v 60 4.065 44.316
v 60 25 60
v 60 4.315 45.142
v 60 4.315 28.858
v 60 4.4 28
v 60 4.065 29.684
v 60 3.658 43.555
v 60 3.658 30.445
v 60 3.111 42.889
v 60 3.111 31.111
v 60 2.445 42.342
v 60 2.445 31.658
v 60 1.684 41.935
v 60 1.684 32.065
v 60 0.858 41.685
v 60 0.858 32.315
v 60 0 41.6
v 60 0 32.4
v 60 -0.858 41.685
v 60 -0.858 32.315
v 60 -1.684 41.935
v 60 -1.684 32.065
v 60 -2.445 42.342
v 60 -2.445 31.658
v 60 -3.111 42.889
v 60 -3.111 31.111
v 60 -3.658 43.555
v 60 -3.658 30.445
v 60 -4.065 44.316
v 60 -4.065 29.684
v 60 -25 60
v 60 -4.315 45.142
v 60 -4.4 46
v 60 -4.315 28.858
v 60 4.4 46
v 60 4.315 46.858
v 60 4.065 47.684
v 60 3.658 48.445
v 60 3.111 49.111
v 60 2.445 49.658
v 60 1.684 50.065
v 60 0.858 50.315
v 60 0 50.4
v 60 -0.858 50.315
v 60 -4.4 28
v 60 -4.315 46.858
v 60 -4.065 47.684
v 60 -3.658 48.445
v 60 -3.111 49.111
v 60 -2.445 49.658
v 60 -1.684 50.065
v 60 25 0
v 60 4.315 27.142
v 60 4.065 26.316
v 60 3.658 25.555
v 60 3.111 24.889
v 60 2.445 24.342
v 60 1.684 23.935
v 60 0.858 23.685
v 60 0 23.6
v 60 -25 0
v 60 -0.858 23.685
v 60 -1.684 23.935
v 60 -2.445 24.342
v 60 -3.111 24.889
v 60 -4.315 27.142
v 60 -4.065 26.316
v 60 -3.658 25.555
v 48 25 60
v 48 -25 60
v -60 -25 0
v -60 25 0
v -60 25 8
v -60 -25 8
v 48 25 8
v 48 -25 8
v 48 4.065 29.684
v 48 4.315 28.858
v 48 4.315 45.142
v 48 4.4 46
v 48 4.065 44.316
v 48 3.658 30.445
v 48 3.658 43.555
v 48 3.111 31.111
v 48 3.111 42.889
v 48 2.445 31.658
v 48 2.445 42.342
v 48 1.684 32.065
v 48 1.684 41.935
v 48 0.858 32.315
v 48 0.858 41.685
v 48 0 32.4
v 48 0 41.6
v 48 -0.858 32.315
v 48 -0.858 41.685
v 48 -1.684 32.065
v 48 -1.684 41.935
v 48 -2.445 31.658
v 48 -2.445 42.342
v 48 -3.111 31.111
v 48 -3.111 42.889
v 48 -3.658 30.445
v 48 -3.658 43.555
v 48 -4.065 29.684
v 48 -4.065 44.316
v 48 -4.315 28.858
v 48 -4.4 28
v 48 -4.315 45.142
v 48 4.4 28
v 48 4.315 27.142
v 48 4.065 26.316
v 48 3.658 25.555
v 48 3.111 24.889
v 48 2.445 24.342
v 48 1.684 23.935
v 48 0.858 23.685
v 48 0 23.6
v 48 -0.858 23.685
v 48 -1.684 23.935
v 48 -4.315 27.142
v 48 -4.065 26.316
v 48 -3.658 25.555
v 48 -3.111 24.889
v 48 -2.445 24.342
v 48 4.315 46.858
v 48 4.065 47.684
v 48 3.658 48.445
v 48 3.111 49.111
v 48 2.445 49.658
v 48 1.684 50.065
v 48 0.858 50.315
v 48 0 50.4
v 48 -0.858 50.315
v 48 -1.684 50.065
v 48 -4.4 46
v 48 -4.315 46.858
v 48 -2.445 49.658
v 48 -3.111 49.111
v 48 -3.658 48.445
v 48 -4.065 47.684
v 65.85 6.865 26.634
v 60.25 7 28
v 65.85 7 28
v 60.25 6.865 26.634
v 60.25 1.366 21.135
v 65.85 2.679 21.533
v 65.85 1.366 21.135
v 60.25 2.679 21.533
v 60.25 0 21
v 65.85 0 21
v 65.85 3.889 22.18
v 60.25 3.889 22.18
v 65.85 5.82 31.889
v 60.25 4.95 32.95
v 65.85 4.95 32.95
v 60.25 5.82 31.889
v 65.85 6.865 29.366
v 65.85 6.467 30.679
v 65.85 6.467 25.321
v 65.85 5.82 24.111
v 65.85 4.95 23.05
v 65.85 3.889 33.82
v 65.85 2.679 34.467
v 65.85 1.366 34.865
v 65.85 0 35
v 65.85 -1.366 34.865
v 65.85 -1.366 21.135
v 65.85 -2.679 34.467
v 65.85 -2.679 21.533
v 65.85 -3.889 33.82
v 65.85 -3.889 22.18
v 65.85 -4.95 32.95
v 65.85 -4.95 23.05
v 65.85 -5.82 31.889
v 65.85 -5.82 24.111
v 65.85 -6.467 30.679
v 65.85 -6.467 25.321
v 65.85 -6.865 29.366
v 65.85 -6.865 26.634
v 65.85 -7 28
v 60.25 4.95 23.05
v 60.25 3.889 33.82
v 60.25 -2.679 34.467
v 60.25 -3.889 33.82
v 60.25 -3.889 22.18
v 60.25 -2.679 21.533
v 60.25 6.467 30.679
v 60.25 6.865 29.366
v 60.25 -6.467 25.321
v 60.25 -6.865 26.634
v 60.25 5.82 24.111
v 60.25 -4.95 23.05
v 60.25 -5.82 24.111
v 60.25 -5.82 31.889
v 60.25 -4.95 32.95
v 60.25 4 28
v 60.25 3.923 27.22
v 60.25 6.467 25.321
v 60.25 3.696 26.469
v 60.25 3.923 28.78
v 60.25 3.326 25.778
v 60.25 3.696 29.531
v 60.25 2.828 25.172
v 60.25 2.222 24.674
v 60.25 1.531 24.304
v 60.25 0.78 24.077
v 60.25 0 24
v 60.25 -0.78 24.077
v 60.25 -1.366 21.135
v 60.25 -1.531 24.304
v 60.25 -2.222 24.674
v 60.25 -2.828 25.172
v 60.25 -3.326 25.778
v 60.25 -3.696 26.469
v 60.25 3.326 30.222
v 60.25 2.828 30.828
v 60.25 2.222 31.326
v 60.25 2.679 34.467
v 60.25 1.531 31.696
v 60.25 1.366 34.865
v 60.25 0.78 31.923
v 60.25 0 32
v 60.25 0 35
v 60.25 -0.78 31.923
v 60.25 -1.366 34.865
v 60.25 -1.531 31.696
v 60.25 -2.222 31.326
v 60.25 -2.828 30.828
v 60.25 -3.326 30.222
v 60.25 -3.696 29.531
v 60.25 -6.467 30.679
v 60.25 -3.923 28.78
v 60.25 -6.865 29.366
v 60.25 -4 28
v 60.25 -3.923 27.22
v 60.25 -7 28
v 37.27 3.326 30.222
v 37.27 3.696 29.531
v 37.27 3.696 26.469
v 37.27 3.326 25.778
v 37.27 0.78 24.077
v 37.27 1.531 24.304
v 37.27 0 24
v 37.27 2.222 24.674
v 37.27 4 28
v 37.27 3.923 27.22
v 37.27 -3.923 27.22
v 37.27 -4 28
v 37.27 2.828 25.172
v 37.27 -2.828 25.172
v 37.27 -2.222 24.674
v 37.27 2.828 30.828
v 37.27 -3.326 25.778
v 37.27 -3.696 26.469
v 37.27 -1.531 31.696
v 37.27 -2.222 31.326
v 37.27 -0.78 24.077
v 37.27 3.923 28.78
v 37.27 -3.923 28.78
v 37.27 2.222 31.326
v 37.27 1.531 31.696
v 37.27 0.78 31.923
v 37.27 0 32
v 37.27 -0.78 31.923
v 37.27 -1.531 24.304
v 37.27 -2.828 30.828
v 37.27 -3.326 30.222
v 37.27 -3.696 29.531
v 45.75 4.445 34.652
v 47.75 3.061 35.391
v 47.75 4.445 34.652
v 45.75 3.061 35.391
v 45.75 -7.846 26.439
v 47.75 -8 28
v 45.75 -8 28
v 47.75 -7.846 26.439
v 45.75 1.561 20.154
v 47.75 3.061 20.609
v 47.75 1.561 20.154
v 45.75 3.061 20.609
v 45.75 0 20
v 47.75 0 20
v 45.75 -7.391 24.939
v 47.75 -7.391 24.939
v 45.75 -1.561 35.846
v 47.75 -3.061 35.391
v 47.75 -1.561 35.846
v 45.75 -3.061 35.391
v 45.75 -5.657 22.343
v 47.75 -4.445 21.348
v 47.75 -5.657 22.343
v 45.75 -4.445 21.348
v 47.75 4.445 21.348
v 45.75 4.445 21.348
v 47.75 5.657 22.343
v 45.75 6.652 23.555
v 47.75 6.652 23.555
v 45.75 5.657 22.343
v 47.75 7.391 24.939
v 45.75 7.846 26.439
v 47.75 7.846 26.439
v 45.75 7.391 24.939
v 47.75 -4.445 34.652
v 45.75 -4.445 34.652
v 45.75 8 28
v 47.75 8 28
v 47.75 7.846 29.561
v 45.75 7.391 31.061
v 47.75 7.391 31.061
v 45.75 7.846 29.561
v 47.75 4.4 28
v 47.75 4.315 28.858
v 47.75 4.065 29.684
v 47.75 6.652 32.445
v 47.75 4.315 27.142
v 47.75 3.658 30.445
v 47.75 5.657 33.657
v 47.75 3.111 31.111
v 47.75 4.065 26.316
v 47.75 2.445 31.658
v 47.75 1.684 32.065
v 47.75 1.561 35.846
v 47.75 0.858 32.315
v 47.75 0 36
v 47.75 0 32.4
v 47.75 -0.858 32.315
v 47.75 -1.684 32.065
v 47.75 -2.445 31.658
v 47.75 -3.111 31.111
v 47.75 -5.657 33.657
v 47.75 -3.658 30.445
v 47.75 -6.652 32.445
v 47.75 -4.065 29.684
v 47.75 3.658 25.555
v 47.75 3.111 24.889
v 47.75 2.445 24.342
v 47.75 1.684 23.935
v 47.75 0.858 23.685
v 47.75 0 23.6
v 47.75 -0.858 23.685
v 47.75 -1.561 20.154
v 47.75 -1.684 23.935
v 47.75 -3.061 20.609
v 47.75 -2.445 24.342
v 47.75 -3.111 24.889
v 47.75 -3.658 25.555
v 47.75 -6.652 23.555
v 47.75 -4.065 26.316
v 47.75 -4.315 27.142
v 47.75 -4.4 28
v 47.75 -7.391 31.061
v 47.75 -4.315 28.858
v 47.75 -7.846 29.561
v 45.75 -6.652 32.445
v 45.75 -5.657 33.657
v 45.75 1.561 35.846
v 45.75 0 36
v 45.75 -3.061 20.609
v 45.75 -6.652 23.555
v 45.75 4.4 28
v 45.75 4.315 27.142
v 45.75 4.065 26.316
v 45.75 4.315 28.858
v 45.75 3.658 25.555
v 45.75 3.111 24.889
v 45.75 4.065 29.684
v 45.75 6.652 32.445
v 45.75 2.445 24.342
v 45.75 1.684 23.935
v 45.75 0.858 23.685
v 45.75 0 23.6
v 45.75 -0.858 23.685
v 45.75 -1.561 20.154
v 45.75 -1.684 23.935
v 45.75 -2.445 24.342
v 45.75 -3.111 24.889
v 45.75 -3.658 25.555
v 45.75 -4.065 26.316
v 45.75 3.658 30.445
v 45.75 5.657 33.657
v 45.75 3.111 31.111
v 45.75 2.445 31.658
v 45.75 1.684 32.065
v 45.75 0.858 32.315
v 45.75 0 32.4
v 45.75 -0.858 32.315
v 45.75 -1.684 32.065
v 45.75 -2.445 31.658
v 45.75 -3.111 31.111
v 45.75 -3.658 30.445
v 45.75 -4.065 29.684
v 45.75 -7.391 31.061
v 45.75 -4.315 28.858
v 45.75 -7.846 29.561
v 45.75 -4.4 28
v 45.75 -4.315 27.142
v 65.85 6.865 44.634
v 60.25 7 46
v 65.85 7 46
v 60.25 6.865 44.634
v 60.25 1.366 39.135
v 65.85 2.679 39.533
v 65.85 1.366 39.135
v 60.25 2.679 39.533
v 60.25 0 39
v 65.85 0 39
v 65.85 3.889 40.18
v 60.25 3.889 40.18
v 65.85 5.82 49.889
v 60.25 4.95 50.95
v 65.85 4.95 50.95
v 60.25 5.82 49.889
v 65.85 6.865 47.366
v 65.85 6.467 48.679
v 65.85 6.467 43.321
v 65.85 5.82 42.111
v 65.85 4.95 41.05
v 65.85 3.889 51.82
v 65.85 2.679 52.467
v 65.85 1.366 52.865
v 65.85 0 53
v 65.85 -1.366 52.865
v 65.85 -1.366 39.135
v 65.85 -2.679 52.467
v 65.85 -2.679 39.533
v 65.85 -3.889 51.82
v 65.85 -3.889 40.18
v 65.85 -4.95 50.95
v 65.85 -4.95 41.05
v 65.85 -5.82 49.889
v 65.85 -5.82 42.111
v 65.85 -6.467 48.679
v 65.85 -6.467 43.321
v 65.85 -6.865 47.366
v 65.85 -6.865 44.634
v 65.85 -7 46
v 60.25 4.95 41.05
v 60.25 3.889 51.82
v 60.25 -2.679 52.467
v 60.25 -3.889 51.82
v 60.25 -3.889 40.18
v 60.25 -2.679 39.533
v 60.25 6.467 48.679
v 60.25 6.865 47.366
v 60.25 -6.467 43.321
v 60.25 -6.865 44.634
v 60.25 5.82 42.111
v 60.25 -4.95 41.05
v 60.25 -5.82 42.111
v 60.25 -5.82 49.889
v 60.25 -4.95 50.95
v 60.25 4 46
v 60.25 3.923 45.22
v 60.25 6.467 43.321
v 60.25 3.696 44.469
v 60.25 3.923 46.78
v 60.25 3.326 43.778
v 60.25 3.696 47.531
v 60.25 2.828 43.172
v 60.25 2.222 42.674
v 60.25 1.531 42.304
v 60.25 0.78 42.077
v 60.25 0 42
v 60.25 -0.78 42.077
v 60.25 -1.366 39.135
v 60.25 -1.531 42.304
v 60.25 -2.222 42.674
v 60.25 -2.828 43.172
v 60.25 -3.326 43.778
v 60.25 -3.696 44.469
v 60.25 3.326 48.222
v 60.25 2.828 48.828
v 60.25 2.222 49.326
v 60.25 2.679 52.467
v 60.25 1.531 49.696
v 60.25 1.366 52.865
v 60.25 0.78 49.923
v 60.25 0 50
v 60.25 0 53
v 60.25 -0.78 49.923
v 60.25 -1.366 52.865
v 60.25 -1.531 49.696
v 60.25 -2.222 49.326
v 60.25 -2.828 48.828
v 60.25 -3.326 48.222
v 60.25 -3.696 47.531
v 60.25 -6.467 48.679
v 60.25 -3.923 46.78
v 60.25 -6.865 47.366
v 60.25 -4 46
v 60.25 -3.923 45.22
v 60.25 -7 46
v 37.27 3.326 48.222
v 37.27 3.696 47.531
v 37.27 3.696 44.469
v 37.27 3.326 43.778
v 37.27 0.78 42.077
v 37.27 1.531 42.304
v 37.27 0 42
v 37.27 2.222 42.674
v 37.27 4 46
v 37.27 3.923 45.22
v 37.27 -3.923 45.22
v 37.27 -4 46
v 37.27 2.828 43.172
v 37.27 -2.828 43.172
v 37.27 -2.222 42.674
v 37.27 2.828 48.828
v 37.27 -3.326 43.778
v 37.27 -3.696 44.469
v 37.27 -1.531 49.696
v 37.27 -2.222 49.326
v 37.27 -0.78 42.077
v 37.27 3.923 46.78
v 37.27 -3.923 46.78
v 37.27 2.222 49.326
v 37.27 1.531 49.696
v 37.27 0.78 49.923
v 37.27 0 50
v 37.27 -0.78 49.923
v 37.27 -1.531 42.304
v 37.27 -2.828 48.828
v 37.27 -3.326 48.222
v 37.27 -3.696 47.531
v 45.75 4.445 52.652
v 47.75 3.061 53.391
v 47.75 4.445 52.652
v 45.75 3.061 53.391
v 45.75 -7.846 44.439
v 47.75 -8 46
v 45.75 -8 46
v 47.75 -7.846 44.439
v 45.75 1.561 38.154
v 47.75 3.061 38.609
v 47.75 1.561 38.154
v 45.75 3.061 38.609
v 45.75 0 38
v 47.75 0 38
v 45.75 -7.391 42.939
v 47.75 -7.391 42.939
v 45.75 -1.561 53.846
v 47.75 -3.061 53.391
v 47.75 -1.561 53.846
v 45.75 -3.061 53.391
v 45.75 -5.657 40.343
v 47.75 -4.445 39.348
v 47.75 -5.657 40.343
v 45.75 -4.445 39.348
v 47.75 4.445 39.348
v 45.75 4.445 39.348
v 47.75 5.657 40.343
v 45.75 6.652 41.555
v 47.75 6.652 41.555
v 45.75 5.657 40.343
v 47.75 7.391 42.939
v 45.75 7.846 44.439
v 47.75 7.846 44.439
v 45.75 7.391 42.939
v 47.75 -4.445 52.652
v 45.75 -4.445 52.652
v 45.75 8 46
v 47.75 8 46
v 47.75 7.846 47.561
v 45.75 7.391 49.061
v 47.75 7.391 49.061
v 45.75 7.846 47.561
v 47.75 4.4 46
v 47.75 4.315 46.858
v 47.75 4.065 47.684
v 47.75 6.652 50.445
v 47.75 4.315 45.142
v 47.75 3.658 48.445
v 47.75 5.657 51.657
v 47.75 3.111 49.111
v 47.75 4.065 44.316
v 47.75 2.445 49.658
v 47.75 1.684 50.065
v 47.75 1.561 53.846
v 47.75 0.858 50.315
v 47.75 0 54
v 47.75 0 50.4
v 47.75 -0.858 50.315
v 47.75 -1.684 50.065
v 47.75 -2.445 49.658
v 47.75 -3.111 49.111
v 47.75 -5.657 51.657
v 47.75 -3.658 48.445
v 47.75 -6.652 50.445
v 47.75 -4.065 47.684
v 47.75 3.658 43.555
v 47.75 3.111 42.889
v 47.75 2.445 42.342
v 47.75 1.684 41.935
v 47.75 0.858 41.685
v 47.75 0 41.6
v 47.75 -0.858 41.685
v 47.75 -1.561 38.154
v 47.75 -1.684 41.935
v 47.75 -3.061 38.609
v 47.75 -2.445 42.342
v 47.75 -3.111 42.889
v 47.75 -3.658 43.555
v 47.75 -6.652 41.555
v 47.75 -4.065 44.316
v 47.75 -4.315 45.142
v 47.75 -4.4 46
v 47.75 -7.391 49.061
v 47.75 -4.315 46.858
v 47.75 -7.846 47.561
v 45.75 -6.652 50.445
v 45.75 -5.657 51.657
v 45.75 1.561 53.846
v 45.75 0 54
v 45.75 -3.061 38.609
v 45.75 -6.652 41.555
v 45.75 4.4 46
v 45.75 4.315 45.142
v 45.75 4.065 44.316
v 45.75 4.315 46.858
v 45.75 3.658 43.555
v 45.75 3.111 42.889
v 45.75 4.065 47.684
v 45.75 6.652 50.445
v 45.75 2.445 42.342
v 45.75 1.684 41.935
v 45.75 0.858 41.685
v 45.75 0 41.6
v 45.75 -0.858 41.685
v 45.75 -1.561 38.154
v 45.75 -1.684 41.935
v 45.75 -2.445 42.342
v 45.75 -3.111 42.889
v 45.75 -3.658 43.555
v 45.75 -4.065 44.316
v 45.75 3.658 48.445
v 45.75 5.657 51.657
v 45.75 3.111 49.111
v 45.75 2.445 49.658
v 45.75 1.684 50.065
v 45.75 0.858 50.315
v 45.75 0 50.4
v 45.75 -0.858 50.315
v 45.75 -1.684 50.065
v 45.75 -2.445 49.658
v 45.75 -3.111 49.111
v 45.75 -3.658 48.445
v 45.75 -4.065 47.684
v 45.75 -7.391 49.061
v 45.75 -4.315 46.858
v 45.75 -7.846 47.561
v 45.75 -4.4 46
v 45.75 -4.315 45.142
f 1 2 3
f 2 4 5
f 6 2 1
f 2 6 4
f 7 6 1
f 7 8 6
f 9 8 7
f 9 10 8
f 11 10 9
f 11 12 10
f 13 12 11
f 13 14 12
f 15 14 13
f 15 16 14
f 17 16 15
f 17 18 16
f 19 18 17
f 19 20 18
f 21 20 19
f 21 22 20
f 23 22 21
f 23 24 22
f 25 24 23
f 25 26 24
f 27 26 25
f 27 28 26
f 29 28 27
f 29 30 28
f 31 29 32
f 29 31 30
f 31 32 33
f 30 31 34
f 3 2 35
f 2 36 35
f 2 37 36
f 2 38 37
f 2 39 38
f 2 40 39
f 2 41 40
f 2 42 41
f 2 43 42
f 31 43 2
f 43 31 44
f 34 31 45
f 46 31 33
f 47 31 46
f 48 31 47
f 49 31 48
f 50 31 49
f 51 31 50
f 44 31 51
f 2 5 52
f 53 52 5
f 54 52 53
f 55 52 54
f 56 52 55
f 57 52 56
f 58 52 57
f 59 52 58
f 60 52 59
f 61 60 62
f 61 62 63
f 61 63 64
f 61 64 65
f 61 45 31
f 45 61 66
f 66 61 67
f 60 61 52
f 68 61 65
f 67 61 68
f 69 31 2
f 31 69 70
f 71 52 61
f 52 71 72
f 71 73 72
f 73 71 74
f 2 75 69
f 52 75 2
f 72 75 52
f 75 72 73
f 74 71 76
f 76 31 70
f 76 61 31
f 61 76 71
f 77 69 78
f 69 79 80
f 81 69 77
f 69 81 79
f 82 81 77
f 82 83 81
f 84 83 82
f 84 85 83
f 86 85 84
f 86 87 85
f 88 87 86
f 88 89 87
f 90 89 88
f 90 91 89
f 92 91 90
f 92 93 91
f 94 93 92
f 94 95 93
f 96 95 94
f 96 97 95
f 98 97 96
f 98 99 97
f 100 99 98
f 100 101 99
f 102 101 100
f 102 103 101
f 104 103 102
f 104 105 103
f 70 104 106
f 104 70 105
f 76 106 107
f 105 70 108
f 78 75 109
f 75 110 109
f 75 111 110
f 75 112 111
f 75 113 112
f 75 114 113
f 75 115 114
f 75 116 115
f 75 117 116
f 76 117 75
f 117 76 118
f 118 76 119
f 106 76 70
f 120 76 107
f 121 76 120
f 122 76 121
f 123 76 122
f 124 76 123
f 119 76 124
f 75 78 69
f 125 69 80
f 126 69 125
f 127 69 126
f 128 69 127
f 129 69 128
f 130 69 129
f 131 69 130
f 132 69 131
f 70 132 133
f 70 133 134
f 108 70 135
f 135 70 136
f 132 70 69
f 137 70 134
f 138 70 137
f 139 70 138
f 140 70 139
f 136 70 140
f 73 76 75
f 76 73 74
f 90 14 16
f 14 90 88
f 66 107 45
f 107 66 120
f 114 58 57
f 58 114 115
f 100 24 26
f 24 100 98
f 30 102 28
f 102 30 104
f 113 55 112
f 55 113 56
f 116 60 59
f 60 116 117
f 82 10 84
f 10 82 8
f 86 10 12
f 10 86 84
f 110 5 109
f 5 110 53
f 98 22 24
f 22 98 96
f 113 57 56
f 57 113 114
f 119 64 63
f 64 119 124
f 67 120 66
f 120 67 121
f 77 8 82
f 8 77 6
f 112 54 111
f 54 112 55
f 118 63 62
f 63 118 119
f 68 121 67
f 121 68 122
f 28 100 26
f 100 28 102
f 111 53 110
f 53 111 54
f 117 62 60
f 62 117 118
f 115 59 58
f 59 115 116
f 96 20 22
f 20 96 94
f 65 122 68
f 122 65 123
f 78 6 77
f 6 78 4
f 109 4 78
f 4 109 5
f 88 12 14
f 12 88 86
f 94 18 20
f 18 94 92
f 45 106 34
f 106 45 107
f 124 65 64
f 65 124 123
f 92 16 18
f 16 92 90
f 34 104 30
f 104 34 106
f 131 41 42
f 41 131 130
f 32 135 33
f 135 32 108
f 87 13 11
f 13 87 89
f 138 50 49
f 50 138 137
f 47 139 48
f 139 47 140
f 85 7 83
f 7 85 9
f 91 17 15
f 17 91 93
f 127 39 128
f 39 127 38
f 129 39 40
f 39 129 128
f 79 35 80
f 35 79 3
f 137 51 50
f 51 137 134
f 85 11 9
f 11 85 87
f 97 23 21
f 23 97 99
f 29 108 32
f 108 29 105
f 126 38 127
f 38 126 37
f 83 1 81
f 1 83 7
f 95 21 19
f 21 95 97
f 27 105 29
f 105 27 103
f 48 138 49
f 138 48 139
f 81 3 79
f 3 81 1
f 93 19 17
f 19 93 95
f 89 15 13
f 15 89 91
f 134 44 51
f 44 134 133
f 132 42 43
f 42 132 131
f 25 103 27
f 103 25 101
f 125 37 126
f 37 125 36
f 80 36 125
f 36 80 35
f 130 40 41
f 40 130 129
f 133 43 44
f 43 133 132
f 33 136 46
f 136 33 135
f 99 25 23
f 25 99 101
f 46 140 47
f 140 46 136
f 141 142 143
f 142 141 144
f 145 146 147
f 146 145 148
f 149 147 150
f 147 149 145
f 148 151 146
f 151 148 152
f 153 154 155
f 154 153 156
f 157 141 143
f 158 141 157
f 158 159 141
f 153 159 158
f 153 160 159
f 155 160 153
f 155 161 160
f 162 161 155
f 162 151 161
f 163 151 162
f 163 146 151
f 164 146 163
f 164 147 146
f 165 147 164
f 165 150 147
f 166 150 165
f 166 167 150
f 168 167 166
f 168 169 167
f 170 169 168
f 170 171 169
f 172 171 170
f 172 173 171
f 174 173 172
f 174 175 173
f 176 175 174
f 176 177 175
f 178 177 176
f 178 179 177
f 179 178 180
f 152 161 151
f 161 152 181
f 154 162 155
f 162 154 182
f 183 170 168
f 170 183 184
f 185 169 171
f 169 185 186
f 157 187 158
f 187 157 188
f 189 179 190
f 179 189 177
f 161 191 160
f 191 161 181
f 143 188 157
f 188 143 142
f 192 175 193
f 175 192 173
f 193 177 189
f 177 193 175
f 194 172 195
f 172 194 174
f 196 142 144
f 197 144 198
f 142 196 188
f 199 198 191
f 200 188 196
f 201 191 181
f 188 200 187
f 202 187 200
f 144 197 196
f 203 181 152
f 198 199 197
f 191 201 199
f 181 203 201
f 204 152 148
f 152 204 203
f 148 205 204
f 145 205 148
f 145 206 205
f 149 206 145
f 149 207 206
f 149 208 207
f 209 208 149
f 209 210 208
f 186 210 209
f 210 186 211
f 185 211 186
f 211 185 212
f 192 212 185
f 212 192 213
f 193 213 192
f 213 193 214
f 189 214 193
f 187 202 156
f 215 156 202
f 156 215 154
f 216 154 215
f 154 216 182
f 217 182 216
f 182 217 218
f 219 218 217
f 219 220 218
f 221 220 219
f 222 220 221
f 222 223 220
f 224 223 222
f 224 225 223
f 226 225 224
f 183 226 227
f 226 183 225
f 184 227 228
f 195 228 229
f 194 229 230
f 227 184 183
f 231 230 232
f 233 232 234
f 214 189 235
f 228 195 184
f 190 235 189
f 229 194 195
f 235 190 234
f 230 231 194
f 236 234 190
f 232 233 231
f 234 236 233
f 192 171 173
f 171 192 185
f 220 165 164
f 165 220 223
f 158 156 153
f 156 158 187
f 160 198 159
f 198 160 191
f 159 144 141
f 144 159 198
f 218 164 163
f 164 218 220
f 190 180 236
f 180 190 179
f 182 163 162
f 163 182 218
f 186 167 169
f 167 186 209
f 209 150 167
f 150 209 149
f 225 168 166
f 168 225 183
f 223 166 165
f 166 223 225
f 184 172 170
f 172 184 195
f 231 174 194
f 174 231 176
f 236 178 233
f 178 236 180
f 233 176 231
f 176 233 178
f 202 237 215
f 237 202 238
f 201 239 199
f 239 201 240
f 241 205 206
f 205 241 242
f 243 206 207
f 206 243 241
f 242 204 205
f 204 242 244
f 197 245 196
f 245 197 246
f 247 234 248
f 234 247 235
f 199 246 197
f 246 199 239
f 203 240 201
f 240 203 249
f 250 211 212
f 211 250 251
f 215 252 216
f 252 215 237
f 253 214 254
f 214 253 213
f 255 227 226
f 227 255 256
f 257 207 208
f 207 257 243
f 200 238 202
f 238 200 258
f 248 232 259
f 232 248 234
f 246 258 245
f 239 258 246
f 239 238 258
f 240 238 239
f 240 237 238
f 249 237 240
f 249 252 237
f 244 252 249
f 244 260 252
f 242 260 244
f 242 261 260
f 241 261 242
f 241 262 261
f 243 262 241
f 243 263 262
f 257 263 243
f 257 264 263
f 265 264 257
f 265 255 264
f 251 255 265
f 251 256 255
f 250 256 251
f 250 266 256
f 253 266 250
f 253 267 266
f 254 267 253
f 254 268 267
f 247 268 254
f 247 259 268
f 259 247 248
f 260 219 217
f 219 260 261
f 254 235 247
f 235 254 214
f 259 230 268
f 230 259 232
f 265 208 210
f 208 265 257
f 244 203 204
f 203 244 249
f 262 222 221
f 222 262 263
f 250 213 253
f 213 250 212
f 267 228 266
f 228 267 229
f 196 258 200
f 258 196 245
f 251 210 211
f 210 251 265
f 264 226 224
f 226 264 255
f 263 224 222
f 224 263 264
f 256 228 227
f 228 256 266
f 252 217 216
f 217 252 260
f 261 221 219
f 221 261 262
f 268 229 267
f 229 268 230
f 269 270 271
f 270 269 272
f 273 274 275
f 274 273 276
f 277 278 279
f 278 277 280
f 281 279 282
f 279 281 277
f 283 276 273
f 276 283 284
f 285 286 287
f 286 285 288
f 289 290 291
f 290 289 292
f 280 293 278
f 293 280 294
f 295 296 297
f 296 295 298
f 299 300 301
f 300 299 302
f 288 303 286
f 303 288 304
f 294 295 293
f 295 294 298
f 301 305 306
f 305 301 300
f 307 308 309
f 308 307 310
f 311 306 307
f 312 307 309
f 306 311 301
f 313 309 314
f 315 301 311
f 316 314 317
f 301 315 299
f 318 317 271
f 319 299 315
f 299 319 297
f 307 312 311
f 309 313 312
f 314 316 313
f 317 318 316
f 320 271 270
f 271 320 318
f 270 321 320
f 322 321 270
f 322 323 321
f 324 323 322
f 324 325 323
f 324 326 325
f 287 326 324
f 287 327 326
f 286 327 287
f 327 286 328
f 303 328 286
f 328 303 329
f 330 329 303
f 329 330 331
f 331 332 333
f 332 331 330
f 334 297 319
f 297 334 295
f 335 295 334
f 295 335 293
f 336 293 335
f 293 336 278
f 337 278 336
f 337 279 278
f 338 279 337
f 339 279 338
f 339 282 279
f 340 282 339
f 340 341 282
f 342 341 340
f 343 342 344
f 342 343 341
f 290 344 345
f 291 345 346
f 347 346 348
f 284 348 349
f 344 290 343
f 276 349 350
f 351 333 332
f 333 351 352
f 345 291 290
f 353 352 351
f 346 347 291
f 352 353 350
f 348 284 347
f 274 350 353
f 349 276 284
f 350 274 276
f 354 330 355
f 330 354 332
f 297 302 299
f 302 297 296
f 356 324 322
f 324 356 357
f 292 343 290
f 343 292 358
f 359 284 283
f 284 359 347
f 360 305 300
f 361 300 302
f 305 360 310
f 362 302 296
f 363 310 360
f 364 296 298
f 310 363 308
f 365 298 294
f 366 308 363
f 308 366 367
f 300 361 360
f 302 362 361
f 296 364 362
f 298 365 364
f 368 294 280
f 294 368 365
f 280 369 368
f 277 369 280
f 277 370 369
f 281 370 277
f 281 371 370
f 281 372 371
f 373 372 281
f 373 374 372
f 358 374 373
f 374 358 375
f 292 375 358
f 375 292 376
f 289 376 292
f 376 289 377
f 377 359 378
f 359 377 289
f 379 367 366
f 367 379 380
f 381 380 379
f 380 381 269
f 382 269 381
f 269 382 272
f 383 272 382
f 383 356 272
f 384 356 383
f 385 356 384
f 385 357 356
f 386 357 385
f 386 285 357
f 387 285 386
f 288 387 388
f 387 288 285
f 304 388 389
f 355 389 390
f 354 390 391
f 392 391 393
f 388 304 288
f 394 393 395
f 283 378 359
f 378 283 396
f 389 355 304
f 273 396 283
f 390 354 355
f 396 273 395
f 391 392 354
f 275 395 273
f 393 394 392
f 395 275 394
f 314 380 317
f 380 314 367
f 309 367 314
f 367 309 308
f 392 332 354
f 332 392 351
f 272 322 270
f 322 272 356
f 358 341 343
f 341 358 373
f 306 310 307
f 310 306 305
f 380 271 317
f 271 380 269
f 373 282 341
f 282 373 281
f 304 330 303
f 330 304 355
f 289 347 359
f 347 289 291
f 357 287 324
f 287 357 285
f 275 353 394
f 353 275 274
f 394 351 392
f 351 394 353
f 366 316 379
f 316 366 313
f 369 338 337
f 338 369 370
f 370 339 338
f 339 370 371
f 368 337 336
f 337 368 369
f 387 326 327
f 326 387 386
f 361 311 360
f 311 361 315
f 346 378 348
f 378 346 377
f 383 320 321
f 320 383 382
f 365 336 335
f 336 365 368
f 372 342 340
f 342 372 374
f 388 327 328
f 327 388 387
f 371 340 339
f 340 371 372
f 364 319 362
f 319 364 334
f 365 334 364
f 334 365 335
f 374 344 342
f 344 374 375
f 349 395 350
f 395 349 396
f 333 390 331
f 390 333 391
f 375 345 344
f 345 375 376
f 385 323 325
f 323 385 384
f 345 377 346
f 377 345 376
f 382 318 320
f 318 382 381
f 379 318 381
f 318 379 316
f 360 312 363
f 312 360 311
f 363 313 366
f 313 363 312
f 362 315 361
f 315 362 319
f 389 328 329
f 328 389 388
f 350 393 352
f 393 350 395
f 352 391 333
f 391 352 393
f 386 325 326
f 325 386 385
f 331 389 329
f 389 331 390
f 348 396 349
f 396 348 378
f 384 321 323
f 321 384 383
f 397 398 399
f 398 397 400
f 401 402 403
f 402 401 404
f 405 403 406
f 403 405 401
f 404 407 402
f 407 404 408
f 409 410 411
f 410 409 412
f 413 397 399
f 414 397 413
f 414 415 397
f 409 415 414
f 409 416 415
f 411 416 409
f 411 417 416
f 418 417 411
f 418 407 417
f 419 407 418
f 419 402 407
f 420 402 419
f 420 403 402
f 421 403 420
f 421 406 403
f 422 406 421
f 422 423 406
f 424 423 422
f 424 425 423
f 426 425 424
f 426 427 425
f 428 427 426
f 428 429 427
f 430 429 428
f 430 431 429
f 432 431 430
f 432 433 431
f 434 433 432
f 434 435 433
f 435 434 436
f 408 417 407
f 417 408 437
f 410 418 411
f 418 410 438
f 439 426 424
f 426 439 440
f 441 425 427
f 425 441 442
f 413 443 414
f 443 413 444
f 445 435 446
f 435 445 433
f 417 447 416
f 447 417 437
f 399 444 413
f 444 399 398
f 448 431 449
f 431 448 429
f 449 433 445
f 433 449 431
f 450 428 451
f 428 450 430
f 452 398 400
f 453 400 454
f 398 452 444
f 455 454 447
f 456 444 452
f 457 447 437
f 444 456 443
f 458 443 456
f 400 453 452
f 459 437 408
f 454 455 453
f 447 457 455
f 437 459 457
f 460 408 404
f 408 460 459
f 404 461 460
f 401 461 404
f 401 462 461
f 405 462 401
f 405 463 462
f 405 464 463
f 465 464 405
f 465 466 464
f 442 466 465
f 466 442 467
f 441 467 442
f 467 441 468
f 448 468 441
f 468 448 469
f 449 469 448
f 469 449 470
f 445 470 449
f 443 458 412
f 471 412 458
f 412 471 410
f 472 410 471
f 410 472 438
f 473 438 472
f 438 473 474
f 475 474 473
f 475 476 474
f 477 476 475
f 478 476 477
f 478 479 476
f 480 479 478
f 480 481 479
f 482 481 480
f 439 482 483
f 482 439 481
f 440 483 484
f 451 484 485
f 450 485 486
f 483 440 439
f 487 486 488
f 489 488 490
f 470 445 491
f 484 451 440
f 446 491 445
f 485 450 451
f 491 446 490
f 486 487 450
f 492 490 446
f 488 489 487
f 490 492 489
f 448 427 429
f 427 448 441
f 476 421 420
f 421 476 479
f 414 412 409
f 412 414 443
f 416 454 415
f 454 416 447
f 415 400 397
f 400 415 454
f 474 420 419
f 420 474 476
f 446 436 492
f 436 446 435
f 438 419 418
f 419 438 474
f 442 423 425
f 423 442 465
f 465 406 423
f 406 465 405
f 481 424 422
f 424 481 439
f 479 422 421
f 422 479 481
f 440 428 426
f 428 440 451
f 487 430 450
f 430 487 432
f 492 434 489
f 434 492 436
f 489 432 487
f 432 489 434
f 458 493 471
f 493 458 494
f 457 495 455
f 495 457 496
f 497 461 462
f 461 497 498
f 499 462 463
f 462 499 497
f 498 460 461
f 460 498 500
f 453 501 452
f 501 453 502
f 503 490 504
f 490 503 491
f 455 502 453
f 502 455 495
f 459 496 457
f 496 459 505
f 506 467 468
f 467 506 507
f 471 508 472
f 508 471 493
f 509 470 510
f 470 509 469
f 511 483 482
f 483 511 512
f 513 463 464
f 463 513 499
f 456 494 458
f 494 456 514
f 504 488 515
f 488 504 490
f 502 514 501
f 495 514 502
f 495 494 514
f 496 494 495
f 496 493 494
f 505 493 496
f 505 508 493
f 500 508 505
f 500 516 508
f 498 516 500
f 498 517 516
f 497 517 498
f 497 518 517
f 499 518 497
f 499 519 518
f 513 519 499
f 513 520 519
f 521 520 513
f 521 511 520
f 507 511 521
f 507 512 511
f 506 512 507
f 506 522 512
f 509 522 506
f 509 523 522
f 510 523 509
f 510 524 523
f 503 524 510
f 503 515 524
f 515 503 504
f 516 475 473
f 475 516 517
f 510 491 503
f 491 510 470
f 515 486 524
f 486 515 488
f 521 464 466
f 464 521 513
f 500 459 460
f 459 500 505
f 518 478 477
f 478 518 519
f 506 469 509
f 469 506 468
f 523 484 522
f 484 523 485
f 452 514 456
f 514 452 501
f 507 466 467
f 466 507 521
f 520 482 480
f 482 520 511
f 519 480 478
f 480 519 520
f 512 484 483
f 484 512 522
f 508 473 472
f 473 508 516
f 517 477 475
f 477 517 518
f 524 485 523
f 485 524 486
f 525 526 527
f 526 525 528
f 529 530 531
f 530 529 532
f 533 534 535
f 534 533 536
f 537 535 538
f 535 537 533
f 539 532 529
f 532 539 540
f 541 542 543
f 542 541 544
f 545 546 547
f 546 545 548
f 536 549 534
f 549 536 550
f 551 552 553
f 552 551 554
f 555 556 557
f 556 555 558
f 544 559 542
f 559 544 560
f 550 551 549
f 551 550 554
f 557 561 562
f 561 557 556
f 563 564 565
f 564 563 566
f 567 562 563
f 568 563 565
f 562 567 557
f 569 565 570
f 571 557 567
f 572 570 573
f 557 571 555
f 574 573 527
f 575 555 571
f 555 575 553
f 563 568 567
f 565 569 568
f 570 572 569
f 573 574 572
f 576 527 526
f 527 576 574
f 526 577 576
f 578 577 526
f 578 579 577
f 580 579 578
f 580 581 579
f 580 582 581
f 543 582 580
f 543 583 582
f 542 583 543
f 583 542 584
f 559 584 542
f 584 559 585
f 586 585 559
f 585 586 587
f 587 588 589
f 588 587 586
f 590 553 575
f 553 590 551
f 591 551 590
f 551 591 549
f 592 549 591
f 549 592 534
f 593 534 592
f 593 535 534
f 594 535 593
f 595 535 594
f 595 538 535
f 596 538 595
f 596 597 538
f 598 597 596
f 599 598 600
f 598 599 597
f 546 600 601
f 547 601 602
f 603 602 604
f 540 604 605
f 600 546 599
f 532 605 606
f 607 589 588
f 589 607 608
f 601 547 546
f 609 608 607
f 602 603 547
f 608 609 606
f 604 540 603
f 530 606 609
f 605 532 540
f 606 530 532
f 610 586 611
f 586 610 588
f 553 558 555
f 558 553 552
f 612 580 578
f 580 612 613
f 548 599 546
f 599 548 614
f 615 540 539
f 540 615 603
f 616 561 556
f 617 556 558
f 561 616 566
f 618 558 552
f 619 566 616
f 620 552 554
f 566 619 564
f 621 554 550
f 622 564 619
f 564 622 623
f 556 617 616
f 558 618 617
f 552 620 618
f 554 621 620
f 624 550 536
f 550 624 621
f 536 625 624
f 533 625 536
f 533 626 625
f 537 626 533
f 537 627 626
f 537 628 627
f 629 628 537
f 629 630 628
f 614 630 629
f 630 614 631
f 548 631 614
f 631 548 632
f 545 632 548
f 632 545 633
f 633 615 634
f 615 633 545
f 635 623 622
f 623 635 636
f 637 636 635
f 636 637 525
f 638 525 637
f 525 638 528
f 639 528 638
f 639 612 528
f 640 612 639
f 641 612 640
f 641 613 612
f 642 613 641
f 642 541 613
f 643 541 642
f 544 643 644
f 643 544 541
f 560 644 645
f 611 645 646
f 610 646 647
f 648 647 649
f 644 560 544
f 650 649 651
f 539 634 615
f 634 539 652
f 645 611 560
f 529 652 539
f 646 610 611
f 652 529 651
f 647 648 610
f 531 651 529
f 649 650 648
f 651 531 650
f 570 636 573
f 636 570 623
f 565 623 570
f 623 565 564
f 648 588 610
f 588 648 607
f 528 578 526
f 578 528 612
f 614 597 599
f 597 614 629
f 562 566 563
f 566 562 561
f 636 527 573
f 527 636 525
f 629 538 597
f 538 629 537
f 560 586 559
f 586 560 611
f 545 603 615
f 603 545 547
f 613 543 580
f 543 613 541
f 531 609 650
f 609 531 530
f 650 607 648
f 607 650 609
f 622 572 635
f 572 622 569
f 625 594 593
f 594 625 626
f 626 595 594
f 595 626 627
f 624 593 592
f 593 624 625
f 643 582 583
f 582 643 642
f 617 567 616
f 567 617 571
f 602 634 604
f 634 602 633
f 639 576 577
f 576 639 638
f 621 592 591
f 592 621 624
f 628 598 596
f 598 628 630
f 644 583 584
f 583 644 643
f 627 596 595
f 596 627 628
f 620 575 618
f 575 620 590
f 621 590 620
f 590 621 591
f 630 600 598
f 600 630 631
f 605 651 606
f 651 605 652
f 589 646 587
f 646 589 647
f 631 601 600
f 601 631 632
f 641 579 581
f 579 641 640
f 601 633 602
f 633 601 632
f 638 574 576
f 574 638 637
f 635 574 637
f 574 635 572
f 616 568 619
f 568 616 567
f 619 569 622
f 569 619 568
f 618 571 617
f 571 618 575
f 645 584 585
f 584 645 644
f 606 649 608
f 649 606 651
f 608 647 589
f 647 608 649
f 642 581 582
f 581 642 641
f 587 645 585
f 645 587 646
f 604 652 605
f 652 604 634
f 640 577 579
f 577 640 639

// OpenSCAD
$fn = 32;

// ------------------------------------------------------------------------
// Bolted bracket: 120 x 50 mm bracket with 2 bolt joints
// Every part is its own module, assembly() places them once.
// ------------------------------------------------------------------------

// --- part 1 ---
module bracket() {
  difference() {
    translate([-60, -25, 0]) cube([120, 50, 60]);
    translate([-61, -26, 8]) cube([109, 52, 53]);
    translate([54, 0, 28]) rotate([0, 90, 0]) cylinder(h = 14, d = 8.8, center = true);
    translate([54, 0, 46]) rotate([0, 90, 0]) cylinder(h = 14, d = 8.8, center = true);
  }
}

// --- part 2 ---
module bolt1() {
  cylinder(h = 5.6, d = 14);
  translate([0, 0, -22.98]) cylinder(h = 22.98, d = 8);
}

// --- part 3 ---
module washer1() {
  difference() {
      translate([0, 0, 0]) cylinder(h = 2, d = 16);
      translate([0, 0, -1]) cylinder(h = 4, d = 8.8);
    }
}

// --- part 4 ---
module bolt2() {
  cylinder(h = 5.6, d = 14);
  translate([0, 0, -22.98]) cylinder(h = 22.98, d = 8);
}

// --- part 5 ---
module washer2() {
  difference() {
      translate([0, 0, 0]) cylinder(h = 2, d = 16);
      translate([0, 0, -1]) cylinder(h = 4, d = 8.8);
    }
}

// --- assembly ---
module assembly() {
  translate([0, 0, 0]) rotate([0, 0, 0]) bracket();
  translate([60.25, 0, 28]) rotate([0, 90, 0]) bolt1();
  translate([45.75, 0, 28]) rotate([0, 90, 0]) washer1();
  translate([60.25, 0, 46]) rotate([0, 90, 0]) bolt2();
  translate([45.75, 0, 46]) rotate([0, 90, 0]) washer2();
}

assembly();
